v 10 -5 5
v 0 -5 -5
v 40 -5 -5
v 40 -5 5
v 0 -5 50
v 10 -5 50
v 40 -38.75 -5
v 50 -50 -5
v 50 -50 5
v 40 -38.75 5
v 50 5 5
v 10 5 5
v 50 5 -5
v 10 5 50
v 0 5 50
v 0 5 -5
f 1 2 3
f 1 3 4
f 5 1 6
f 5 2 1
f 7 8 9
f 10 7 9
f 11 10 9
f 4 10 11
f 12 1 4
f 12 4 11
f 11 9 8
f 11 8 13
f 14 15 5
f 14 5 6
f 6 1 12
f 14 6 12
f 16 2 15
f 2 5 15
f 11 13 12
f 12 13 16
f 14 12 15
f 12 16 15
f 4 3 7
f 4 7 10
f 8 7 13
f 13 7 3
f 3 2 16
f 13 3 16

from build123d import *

# Parameters (mm, degrees)
F0_W     = 10
F0_H     = 10
F1_DEPTH = 50
F2_W     = 10
F2_H     = 10
F3_DEPTH = 50
F4_W     = 10
F4_H     = 10
F5_DEPTH = 50
F6_SIZE2 = 9.99999
F6_SIZE  = 11.24999


# Not quite as in the source:
# - a fillet or chamfer is up to 0.001 mm smaller than in the source, because OpenCascade refuses the exact size


with BuildPart() as f1:
    # F0 (on Right) → F1 (new body)
    with BuildSketch(Plane.YZ):
        Rectangle(F0_W, F0_H)
    extrude(amount=F1_DEPTH)

    # F2 (on Top) → F3 (join)
    with BuildSketch(Plane.XY):
        with Locations((5, 0)):
            Rectangle(F2_W, F2_H)
    extrude(amount=F3_DEPTH)

    # F4 (on Front) → F5 (join)
    with BuildSketch(Plane.XZ):
        with Locations((45, 0)):
            Rectangle(F4_W, F4_H)
    extrude(amount=F5_DEPTH)

    # F6 (size 11.25 and 10 in the source; OpenCascade refuses exactly that, so slightly less here)
    f6_edges = [f1.edges().sort_by_distance(p)[0] for p in [
        (40, -50, 0),
    ]]
    f6_side = f1.faces().sort_by_distance((40, -27.5, 0))[0]
    chamfer(f6_edges, length=F6_SIZE, length2=F6_SIZE2, reference=f6_side)


solid = f1.part
